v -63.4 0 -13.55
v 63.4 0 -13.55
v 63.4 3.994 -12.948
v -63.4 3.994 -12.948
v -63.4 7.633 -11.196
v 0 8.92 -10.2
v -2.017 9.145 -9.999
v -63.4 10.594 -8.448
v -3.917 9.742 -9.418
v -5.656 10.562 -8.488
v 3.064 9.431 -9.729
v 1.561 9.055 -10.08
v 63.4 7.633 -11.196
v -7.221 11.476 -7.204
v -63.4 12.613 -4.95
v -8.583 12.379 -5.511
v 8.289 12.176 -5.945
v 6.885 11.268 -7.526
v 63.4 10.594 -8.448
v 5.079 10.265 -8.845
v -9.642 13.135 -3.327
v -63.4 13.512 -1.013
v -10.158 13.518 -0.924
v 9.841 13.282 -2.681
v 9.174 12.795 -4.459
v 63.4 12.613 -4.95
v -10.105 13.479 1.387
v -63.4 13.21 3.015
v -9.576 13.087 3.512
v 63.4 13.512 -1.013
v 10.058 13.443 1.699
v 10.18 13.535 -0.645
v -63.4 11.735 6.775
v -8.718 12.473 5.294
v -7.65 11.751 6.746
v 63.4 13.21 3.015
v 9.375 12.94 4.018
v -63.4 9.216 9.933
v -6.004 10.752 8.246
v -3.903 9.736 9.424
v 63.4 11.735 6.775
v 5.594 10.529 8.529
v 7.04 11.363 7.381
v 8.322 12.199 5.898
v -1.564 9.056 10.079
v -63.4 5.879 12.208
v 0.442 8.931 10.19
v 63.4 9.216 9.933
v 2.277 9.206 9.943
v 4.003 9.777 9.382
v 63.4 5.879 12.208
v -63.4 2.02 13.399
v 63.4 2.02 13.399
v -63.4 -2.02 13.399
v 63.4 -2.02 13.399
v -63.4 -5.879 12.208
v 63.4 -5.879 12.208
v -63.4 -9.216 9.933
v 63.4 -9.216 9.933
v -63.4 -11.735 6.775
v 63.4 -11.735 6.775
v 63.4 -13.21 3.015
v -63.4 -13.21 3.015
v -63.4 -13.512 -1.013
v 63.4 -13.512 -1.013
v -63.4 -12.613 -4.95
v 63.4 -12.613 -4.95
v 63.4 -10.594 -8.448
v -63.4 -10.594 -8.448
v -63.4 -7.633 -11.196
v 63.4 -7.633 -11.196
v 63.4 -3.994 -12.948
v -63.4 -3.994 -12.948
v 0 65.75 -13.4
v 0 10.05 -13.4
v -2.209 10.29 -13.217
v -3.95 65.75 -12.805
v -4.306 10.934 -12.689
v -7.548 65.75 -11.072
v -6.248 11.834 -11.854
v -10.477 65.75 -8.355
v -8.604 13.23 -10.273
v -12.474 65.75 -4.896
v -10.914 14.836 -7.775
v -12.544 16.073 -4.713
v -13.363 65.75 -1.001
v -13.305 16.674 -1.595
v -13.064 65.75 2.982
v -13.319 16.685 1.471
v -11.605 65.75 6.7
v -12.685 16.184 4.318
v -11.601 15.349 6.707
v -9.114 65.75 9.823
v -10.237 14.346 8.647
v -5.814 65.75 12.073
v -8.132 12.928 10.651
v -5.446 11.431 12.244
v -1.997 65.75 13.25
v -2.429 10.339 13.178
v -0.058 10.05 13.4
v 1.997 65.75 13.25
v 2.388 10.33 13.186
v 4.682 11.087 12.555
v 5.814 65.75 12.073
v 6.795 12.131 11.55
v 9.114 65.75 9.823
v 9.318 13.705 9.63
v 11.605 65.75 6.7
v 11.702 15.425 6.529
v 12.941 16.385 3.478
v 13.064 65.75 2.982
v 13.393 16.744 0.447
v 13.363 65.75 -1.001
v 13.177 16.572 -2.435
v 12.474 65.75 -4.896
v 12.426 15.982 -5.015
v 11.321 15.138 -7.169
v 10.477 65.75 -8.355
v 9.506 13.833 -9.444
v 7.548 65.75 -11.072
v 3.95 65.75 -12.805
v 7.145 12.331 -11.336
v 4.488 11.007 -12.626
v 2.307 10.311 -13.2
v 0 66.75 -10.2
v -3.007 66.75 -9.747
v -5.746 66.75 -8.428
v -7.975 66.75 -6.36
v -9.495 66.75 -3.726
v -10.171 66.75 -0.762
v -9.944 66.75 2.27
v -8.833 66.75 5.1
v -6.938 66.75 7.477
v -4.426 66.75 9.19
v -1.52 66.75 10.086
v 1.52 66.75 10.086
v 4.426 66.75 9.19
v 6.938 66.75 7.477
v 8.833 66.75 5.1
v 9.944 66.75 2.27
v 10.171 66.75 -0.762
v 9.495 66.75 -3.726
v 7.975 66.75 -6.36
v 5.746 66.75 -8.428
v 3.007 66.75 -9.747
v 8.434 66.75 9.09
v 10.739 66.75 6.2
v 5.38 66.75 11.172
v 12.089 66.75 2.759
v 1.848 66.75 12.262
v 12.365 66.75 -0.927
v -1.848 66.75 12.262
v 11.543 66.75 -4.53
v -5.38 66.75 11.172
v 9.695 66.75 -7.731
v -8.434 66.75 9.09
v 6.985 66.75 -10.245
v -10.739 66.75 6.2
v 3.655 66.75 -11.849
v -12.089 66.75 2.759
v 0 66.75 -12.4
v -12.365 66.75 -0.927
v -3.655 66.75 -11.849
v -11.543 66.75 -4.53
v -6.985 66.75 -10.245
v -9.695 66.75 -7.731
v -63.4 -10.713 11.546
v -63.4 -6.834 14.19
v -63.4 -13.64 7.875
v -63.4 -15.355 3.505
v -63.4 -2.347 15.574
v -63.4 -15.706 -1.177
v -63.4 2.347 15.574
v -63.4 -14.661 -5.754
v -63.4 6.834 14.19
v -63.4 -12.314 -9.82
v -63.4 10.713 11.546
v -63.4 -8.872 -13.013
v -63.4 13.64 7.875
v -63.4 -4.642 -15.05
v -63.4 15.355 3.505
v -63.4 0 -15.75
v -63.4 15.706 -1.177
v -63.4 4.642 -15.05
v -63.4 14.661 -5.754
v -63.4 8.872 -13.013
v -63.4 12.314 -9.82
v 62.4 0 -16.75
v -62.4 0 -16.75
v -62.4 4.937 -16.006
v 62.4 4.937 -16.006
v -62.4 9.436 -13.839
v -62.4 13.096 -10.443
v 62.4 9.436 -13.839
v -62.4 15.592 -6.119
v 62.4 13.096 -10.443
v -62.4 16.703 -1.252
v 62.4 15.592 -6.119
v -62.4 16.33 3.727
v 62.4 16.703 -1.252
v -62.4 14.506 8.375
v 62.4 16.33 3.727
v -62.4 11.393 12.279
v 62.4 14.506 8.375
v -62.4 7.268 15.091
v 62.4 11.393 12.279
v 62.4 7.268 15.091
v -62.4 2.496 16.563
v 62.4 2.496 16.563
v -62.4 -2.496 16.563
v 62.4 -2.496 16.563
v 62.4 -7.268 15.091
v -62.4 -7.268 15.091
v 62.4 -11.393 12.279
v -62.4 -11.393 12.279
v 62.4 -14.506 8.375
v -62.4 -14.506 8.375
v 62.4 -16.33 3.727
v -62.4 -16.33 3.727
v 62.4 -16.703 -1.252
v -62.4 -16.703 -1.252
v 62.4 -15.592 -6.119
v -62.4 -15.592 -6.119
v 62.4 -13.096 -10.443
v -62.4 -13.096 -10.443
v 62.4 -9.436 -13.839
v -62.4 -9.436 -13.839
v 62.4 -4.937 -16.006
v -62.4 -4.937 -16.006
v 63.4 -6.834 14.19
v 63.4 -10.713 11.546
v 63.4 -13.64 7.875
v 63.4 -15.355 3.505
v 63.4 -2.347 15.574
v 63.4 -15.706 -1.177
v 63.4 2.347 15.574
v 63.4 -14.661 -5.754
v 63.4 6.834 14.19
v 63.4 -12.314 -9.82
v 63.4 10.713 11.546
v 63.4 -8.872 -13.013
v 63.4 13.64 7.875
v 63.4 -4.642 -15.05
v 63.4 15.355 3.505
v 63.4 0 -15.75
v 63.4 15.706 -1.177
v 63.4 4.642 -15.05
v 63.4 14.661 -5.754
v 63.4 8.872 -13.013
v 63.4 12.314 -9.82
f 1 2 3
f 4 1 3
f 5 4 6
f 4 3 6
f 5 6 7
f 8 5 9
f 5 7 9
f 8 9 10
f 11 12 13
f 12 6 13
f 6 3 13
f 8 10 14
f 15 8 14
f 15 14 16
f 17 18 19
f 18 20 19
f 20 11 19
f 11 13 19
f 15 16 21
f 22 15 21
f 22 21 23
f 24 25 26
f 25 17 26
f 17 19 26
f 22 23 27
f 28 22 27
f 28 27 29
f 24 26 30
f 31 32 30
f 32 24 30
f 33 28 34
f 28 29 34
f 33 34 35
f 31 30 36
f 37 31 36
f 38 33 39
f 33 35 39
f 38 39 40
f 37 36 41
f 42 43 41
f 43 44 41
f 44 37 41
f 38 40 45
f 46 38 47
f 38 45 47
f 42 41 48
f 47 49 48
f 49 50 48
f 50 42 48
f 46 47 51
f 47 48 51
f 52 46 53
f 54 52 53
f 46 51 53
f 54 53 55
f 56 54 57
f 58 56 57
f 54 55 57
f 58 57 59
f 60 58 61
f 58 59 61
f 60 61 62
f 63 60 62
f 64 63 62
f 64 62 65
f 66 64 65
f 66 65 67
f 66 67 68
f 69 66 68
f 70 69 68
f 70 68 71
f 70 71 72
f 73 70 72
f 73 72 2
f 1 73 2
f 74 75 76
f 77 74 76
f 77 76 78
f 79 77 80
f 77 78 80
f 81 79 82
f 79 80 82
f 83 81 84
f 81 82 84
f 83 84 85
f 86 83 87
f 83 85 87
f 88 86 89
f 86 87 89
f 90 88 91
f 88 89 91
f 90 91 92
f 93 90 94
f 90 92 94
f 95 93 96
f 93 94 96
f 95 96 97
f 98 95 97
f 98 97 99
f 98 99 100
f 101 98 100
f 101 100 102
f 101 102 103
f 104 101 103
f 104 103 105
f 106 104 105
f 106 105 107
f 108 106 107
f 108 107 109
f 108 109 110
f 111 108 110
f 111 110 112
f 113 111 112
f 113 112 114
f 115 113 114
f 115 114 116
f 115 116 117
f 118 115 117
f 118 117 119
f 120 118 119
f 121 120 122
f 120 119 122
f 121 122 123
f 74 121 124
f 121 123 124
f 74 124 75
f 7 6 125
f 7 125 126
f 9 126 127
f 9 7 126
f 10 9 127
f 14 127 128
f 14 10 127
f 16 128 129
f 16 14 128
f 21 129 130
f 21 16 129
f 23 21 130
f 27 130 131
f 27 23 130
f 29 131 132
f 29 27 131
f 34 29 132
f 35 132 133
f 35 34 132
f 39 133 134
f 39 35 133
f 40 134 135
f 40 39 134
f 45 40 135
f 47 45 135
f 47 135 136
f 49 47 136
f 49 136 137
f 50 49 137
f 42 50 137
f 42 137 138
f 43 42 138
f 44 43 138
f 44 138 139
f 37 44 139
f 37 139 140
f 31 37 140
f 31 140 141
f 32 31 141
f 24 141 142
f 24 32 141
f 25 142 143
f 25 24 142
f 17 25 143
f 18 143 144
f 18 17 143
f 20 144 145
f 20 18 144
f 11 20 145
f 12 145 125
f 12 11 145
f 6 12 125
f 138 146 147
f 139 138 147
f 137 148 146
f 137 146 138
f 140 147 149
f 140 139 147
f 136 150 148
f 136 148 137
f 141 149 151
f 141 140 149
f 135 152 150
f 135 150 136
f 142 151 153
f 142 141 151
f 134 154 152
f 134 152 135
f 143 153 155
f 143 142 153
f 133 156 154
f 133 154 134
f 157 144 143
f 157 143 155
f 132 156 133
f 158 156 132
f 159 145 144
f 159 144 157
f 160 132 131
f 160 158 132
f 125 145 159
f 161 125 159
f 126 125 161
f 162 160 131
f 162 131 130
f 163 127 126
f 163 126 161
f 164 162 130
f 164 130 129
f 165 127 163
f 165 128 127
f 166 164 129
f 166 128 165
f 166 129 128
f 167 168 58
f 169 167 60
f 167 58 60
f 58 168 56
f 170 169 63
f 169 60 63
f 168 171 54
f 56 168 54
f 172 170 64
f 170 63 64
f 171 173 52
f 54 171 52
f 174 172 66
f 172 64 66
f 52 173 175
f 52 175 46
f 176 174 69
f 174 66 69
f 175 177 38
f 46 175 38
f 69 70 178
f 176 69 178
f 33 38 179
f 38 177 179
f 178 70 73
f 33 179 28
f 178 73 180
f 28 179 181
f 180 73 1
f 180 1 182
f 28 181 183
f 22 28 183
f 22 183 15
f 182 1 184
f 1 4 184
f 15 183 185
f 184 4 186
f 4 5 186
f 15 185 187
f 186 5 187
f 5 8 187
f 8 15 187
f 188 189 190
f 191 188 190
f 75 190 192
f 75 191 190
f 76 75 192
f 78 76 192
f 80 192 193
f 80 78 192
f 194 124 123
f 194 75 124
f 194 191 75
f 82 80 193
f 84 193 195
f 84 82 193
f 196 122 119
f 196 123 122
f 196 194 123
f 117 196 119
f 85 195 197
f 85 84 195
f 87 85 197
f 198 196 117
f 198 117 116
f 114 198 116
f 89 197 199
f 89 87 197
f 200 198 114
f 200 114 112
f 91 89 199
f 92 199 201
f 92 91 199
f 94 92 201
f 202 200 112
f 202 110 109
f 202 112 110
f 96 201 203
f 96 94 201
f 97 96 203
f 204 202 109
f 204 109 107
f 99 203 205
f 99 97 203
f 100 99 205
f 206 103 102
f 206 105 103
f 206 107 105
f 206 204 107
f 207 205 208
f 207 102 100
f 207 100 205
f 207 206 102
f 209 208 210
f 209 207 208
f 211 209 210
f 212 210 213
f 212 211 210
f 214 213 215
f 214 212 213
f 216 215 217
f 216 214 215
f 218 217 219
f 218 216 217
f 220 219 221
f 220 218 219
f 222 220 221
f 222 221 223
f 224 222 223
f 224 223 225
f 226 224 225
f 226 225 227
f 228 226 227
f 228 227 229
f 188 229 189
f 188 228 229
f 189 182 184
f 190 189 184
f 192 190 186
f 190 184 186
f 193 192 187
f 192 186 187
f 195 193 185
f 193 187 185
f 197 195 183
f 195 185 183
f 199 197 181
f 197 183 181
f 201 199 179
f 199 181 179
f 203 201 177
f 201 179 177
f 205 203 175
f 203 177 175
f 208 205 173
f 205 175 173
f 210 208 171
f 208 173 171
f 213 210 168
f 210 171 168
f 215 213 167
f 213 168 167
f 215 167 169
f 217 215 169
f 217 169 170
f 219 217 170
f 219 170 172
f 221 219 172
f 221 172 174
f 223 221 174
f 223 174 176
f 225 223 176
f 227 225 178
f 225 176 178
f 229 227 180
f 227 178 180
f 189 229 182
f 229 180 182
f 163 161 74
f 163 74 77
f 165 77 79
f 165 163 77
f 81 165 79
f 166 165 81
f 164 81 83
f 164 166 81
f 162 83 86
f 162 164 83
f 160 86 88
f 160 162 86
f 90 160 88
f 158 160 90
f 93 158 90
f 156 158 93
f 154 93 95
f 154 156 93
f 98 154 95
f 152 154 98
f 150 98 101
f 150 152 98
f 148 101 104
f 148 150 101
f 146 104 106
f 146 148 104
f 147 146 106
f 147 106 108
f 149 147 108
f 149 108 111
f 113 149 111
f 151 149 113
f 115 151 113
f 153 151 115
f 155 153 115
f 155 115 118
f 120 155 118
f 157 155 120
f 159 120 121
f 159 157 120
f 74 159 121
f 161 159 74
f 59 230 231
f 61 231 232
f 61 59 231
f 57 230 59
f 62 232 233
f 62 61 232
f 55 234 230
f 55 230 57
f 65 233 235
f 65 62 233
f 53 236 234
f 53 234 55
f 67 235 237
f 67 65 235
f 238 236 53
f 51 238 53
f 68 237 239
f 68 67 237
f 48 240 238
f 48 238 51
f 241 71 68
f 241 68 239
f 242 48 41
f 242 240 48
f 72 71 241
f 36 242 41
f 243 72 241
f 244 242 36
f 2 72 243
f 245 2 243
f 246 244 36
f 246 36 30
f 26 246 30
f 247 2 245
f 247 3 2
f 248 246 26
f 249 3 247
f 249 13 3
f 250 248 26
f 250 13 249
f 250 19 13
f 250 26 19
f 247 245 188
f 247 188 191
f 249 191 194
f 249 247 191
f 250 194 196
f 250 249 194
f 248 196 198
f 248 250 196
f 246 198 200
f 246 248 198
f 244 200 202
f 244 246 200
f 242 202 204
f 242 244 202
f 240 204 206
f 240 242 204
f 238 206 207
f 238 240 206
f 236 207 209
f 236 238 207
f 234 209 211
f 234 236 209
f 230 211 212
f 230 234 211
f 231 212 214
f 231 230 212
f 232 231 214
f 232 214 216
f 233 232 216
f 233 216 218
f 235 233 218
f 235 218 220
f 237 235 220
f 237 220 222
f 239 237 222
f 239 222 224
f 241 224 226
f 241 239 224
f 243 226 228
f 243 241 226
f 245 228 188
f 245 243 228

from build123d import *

# Parameters (mm, degrees)
RUNROUTE_R          = 16.75
RUNEXTRUDE_DEPTH    = 63.4
OUTLETROUTE_R       = 13.4
OUTLETEXTRUDE_DEPTH = 66.75
TEESHELL_T          = -3.2
TEECHAMFER_SIZE     = 1


with BuildPart() as part:
    # RunRoute → RunExtrude (new body)
    with BuildSketch(Plane(origin=(0, 0, 0), x_dir=(0, 0, -1), z_dir=(1, 0, 0))):
        Circle(RUNROUTE_R)
    runextrude = extrude(amount=RUNEXTRUDE_DEPTH)

    # RunExtrudeMirror: RunExtrude across plane
    add(runextrude.mirror(Plane(origin=(0, 0, 0), x_dir=(0, 0, 1), z_dir=(1, 0, 0))))

    # OutletRoute → OutletExtrude (add)
    with BuildSketch(Plane(origin=(0, 0, 0), x_dir=(1, 0, 0), z_dir=(0, 1, 0))):
        Circle(OUTLETROUTE_R)
    extrude(amount=OUTLETEXTRUDE_DEPTH)

    # TeeShell
    teeshell_openings = [part.faces().sort_by_distance(p)[0] for p in [
        (-63.4, 0, 0),
        (63.4, 0, 0),
        (0, 66.75, 0),
    ]]
    offset(amount=TEESHELL_T, openings=teeshell_openings, kind=Kind.INTERSECTION)

    # TeeChamfer
    teechamfer_edges = [part.edges().sort_by_distance(p)[0] for p in [
        (-13.4, 66.75, 0),
        (63.4, 0, 16.75),
        (-63.4, 0, 16.75),
    ]]
    chamfer(teechamfer_edges, length=TEECHAMFER_SIZE)


solid = part.part
